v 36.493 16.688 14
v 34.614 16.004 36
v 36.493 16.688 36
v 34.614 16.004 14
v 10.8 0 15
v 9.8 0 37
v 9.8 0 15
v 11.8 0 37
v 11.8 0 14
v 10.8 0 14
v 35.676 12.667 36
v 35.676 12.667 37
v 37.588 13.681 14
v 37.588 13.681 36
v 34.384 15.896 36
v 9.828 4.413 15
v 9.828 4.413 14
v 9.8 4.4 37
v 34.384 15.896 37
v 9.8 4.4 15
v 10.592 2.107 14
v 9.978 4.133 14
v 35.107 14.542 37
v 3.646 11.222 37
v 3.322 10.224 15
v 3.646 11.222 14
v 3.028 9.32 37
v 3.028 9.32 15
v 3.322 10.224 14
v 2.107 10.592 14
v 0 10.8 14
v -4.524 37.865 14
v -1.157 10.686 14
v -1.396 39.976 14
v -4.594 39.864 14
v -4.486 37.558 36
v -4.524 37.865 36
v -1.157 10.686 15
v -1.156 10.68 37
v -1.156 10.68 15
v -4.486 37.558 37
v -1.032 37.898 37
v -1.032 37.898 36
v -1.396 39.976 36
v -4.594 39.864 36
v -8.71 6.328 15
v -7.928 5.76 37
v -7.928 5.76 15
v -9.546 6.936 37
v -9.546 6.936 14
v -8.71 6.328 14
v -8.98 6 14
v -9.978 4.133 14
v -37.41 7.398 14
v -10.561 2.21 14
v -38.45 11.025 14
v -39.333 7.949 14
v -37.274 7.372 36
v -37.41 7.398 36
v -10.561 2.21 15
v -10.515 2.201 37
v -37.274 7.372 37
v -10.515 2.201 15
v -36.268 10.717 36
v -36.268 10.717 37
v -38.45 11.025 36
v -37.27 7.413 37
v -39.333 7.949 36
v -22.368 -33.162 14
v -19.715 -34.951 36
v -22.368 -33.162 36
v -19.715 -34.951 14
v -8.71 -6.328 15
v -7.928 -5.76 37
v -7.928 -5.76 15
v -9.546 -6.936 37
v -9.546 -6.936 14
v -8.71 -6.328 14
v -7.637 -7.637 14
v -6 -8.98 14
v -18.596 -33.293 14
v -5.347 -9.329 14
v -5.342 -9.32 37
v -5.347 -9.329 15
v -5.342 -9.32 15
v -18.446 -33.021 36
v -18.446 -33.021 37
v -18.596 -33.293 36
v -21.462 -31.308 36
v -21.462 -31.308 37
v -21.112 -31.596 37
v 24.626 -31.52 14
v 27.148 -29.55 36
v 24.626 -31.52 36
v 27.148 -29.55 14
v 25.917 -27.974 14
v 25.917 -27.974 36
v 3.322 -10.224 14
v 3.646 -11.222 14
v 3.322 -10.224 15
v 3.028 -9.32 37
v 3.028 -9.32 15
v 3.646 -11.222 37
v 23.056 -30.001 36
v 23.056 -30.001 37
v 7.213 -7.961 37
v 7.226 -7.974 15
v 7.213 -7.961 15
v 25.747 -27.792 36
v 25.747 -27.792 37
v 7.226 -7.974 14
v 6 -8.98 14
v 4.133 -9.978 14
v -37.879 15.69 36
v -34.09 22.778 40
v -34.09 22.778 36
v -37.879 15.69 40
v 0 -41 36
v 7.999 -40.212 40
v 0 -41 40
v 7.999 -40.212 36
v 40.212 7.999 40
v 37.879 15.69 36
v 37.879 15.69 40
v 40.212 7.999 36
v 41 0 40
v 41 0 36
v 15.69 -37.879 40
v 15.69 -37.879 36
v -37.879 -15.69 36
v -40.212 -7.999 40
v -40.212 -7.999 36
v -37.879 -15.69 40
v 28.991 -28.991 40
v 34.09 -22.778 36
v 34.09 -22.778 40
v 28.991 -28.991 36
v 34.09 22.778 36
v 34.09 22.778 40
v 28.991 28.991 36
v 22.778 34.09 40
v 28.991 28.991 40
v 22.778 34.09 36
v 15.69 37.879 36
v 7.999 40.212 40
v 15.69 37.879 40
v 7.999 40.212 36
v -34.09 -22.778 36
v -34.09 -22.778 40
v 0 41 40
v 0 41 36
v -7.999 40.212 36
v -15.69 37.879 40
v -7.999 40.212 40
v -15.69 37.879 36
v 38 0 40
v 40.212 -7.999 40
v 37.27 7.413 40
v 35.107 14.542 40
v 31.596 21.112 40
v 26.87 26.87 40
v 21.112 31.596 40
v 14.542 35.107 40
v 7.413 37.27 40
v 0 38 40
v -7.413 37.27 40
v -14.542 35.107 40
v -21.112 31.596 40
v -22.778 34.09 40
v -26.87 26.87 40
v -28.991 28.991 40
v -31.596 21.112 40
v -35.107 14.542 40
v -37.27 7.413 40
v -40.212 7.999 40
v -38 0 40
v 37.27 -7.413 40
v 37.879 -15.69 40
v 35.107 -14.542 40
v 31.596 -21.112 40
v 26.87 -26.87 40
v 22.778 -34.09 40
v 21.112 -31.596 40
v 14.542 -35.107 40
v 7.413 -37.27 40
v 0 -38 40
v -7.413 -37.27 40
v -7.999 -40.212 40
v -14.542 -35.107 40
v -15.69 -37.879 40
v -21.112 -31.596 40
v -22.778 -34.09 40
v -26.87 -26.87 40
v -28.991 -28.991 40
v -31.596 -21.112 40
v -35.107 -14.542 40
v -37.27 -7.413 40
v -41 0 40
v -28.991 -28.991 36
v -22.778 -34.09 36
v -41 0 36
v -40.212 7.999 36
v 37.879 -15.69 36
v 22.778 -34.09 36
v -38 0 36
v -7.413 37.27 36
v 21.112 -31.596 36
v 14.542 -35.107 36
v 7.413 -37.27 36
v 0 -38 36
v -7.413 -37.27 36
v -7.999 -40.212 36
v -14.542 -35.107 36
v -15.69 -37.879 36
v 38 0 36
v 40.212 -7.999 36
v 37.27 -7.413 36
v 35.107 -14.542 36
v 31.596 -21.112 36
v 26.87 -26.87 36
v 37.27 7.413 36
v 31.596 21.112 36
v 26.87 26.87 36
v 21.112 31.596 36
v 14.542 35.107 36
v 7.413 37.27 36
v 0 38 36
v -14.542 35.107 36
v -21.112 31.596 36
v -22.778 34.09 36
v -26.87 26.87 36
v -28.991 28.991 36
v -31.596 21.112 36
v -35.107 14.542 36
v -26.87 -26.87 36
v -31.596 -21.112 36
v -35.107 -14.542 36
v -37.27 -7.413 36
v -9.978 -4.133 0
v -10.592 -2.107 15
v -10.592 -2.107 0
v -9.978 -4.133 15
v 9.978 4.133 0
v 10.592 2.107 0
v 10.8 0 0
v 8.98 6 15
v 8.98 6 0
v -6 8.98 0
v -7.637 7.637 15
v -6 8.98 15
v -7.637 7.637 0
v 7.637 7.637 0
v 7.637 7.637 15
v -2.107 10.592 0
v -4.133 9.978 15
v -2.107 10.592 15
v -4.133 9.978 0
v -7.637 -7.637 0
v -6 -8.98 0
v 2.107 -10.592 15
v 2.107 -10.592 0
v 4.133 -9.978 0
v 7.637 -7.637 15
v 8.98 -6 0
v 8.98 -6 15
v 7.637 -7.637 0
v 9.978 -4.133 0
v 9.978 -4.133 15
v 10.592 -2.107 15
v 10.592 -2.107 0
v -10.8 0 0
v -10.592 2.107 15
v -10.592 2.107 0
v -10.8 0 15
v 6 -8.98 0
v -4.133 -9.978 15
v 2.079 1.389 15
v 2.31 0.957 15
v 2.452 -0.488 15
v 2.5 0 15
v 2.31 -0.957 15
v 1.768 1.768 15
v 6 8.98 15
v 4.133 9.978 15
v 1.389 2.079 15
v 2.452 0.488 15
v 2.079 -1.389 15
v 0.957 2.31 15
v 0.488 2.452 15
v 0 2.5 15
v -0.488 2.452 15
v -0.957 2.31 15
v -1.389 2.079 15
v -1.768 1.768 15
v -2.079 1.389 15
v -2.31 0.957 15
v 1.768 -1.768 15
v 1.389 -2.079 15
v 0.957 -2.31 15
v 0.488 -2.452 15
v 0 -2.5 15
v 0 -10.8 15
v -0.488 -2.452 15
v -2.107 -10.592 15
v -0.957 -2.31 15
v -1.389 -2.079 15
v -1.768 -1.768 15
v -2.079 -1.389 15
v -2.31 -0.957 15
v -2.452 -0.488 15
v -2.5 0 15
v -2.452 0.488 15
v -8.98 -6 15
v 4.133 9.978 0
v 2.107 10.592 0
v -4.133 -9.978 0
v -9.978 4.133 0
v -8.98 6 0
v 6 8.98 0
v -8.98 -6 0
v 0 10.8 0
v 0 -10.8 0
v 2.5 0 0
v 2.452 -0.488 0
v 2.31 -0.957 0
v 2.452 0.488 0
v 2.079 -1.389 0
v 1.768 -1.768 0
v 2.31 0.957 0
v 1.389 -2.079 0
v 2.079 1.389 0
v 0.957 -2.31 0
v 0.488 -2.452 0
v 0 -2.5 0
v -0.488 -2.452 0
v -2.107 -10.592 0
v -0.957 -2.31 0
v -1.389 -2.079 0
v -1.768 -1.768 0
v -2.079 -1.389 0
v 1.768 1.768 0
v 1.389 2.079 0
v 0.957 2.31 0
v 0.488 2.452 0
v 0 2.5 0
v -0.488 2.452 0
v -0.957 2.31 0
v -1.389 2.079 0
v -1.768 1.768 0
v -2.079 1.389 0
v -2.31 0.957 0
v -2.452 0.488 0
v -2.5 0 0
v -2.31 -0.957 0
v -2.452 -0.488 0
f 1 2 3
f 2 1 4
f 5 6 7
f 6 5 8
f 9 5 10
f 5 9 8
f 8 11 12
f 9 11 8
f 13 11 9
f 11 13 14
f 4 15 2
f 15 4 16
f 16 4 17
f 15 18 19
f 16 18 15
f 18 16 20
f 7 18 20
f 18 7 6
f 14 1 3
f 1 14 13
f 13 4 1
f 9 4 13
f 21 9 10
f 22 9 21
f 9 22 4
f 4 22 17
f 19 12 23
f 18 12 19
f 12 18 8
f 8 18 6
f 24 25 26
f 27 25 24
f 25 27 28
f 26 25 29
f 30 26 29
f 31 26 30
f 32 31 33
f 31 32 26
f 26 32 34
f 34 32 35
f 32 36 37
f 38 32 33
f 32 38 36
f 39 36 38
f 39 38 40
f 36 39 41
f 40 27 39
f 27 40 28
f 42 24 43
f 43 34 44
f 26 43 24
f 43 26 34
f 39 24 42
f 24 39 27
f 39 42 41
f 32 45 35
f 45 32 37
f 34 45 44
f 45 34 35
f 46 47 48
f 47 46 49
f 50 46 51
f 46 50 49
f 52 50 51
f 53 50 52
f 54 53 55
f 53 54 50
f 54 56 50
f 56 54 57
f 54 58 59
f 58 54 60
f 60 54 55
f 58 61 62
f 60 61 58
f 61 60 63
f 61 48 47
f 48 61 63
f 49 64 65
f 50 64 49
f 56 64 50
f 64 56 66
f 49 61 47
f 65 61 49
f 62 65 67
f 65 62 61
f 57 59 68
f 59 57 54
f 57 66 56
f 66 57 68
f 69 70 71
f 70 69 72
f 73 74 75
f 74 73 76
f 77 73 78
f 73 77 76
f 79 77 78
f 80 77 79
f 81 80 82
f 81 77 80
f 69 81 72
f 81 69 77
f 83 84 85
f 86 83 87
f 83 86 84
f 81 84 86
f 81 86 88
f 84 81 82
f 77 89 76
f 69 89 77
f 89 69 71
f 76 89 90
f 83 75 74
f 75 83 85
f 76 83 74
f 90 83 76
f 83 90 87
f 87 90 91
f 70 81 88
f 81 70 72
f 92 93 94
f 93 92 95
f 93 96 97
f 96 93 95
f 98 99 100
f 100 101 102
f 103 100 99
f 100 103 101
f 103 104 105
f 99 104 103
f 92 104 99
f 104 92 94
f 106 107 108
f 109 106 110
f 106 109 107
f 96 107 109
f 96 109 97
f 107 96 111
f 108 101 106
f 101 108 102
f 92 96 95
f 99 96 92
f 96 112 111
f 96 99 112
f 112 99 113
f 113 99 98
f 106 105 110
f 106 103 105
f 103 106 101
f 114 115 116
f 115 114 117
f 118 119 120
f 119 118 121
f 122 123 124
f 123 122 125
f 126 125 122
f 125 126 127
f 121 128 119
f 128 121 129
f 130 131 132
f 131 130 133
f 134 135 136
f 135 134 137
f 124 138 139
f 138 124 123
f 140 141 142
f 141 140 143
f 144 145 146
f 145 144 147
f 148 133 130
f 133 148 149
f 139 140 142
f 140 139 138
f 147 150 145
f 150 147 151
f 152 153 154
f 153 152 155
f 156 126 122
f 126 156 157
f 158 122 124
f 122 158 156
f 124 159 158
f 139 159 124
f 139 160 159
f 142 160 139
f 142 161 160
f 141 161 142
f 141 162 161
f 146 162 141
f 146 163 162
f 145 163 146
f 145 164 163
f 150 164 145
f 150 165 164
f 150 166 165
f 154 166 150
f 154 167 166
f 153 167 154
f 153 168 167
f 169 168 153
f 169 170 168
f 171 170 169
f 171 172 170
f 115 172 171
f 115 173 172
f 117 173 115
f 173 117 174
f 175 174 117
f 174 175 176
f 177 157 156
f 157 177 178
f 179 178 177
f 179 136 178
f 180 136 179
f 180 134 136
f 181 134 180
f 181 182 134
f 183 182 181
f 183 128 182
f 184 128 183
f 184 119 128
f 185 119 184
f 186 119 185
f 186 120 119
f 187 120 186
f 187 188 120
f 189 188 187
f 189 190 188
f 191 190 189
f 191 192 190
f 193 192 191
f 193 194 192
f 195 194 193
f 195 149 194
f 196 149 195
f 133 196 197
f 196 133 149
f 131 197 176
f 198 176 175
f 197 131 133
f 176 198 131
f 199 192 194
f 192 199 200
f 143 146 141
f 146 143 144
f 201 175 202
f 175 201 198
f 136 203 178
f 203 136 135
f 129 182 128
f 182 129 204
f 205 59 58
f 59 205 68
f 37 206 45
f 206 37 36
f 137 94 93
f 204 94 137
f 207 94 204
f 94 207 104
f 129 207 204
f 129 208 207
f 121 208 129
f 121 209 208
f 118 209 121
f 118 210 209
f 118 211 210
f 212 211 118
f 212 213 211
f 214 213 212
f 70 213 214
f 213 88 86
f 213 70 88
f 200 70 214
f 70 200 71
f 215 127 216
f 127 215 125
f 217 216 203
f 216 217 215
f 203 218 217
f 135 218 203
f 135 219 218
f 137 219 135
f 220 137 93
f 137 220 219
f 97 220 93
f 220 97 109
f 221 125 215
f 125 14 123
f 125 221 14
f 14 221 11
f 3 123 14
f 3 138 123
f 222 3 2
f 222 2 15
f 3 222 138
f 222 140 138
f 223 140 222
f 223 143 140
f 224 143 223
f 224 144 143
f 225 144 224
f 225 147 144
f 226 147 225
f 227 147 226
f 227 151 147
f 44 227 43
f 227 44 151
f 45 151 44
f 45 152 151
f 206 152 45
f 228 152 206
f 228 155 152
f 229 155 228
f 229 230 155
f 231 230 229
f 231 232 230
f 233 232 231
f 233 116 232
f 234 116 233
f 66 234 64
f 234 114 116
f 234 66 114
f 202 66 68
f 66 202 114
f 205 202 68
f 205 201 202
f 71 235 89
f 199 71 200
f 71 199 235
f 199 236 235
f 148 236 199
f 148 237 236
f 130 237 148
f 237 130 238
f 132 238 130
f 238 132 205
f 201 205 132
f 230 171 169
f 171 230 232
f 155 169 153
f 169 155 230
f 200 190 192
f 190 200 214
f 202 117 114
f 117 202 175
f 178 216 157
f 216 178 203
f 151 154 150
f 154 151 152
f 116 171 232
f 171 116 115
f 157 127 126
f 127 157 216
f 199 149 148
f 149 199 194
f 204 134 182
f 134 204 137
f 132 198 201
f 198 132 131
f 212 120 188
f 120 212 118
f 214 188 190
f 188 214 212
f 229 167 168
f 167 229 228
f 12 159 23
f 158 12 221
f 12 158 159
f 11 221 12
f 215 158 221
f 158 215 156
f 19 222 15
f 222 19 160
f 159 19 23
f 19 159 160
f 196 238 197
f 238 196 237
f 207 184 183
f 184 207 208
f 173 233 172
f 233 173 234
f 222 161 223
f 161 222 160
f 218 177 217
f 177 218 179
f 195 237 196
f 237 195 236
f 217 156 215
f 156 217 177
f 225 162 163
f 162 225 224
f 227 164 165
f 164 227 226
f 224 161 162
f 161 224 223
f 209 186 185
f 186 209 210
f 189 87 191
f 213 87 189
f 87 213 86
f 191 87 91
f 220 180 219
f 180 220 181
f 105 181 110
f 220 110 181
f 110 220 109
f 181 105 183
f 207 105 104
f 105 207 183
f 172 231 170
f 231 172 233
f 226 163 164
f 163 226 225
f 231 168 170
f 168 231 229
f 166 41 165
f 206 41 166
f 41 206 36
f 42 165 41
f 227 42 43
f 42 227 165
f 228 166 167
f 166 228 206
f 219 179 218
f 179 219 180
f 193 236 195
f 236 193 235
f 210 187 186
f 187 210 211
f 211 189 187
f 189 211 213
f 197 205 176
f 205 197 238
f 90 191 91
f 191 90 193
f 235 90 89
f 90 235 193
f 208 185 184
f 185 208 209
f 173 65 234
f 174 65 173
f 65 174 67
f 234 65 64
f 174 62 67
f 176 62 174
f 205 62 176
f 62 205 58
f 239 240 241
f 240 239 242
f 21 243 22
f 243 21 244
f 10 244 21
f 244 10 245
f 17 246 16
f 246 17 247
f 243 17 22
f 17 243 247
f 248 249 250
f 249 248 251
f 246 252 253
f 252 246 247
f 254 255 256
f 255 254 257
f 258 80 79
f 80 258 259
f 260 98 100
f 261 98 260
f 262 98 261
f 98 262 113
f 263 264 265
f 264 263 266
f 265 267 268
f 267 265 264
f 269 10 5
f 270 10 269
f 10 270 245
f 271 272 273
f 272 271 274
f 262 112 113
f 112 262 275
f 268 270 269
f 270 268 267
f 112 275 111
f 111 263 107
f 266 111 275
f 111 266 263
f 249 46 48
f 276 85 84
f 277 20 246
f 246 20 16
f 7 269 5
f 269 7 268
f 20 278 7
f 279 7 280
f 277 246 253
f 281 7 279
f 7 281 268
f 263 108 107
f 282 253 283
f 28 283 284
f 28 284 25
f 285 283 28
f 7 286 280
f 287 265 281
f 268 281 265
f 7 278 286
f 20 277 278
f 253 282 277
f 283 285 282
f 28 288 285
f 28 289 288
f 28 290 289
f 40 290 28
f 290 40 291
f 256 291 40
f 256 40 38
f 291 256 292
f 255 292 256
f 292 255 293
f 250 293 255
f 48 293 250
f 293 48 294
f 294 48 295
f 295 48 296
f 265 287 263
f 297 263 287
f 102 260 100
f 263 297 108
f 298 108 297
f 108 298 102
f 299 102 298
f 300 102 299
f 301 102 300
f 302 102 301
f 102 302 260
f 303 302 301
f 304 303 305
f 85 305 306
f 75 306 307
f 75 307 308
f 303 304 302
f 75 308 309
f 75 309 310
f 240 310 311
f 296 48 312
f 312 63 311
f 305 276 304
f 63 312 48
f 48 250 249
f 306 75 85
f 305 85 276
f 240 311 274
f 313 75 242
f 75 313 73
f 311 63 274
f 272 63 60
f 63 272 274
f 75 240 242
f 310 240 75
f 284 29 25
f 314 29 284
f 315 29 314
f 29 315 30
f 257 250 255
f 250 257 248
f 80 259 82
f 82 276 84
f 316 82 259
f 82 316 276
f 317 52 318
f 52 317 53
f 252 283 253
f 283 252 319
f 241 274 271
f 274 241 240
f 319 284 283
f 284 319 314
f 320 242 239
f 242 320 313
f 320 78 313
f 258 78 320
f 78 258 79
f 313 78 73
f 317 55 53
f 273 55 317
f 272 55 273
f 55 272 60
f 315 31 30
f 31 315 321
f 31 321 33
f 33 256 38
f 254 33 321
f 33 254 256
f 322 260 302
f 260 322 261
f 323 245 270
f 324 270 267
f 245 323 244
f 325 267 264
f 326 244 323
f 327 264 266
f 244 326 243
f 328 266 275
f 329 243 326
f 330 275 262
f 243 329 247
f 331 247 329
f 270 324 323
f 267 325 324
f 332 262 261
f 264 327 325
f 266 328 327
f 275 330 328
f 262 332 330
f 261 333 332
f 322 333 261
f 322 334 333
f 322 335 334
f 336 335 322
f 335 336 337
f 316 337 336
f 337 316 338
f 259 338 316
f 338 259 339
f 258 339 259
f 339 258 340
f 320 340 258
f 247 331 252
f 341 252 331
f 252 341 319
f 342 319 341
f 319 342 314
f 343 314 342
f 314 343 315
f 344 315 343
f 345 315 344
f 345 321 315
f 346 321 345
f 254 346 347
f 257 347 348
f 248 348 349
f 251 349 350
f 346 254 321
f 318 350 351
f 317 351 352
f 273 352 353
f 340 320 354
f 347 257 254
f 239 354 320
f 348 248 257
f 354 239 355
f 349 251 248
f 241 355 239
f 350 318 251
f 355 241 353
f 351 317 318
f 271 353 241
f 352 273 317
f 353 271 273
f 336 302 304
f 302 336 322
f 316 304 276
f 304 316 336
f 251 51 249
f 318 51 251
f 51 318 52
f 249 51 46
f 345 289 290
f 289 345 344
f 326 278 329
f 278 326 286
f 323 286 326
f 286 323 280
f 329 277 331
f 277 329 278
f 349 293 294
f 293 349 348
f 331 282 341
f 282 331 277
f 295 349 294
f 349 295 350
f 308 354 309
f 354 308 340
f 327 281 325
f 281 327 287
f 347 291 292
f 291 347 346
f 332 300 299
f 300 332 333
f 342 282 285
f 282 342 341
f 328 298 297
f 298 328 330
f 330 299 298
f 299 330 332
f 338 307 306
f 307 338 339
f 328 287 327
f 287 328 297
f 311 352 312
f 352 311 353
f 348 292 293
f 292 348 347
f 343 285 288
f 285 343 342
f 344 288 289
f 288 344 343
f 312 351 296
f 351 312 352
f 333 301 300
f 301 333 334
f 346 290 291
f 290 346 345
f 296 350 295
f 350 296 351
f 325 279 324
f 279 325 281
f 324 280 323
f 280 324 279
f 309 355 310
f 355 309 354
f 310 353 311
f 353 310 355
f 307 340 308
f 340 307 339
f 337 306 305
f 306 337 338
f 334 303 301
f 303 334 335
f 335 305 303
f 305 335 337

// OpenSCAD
$fn = 32;

// ----------------------------------------------------------------------
// Impeller: 80 mm, 5 blades, 40 mm tall
// ----------------------------------------------------------------------

// --- parameters (mm) ---
boss_d = 21.6;            // hub diameter
boss_h = 15;              // hub height
rotor_d = 80;             // outer diameter over the blades
vane_count = 5;           // number of blades
blade_t = 2;              // blade thickness
blade_h = 22;             // blade height
blade_in_r = 9.8;         // blade root radius
blade_out_r = 38;         // blade tip radius
sweep = 20;               // blade sweep, degrees
bore_d = 5;               // shaft bore
shroud_h = 3;             // shroud ring thickness
shroud_d = 82;            // shroud outside diameter

module hub() {
  cylinder(h = boss_h, d = boss_d);
}

module blade() {
  /* blade swept between two boxes: hull of the root and the tip section */
  hull() {
    translate([blade_in_r, 0, boss_h - 1])
      cube([blade_t, blade_t * 2.2, blade_h + 1], center = false);
    rotate([0, 0, sweep])
      translate([blade_out_r, 0, boss_h - 1])
        cube([blade_t, blade_t * 1.6, blade_h + 1], center = false);
  }
}

module blades() {
  for (i = [0 : vane_count - 1])
    rotate([0, 0, i * 360 / vane_count]) blade();
}

module shroud() {
  translate([0, 0, boss_h + blade_h - 1])
    difference() {
      cylinder(h = shroud_h + 1, d = shroud_d);
      translate([0, 0, -1]) cylinder(h = shroud_h + 3, d = shroud_d - 2 * 3);
    }
}

difference() {
  union() {
    hub();
    blades();
    shroud();
  }
  translate([0, 0, -1]) cylinder(h = boss_h + blade_h + shroud_h + 3, d = bore_d);
}
